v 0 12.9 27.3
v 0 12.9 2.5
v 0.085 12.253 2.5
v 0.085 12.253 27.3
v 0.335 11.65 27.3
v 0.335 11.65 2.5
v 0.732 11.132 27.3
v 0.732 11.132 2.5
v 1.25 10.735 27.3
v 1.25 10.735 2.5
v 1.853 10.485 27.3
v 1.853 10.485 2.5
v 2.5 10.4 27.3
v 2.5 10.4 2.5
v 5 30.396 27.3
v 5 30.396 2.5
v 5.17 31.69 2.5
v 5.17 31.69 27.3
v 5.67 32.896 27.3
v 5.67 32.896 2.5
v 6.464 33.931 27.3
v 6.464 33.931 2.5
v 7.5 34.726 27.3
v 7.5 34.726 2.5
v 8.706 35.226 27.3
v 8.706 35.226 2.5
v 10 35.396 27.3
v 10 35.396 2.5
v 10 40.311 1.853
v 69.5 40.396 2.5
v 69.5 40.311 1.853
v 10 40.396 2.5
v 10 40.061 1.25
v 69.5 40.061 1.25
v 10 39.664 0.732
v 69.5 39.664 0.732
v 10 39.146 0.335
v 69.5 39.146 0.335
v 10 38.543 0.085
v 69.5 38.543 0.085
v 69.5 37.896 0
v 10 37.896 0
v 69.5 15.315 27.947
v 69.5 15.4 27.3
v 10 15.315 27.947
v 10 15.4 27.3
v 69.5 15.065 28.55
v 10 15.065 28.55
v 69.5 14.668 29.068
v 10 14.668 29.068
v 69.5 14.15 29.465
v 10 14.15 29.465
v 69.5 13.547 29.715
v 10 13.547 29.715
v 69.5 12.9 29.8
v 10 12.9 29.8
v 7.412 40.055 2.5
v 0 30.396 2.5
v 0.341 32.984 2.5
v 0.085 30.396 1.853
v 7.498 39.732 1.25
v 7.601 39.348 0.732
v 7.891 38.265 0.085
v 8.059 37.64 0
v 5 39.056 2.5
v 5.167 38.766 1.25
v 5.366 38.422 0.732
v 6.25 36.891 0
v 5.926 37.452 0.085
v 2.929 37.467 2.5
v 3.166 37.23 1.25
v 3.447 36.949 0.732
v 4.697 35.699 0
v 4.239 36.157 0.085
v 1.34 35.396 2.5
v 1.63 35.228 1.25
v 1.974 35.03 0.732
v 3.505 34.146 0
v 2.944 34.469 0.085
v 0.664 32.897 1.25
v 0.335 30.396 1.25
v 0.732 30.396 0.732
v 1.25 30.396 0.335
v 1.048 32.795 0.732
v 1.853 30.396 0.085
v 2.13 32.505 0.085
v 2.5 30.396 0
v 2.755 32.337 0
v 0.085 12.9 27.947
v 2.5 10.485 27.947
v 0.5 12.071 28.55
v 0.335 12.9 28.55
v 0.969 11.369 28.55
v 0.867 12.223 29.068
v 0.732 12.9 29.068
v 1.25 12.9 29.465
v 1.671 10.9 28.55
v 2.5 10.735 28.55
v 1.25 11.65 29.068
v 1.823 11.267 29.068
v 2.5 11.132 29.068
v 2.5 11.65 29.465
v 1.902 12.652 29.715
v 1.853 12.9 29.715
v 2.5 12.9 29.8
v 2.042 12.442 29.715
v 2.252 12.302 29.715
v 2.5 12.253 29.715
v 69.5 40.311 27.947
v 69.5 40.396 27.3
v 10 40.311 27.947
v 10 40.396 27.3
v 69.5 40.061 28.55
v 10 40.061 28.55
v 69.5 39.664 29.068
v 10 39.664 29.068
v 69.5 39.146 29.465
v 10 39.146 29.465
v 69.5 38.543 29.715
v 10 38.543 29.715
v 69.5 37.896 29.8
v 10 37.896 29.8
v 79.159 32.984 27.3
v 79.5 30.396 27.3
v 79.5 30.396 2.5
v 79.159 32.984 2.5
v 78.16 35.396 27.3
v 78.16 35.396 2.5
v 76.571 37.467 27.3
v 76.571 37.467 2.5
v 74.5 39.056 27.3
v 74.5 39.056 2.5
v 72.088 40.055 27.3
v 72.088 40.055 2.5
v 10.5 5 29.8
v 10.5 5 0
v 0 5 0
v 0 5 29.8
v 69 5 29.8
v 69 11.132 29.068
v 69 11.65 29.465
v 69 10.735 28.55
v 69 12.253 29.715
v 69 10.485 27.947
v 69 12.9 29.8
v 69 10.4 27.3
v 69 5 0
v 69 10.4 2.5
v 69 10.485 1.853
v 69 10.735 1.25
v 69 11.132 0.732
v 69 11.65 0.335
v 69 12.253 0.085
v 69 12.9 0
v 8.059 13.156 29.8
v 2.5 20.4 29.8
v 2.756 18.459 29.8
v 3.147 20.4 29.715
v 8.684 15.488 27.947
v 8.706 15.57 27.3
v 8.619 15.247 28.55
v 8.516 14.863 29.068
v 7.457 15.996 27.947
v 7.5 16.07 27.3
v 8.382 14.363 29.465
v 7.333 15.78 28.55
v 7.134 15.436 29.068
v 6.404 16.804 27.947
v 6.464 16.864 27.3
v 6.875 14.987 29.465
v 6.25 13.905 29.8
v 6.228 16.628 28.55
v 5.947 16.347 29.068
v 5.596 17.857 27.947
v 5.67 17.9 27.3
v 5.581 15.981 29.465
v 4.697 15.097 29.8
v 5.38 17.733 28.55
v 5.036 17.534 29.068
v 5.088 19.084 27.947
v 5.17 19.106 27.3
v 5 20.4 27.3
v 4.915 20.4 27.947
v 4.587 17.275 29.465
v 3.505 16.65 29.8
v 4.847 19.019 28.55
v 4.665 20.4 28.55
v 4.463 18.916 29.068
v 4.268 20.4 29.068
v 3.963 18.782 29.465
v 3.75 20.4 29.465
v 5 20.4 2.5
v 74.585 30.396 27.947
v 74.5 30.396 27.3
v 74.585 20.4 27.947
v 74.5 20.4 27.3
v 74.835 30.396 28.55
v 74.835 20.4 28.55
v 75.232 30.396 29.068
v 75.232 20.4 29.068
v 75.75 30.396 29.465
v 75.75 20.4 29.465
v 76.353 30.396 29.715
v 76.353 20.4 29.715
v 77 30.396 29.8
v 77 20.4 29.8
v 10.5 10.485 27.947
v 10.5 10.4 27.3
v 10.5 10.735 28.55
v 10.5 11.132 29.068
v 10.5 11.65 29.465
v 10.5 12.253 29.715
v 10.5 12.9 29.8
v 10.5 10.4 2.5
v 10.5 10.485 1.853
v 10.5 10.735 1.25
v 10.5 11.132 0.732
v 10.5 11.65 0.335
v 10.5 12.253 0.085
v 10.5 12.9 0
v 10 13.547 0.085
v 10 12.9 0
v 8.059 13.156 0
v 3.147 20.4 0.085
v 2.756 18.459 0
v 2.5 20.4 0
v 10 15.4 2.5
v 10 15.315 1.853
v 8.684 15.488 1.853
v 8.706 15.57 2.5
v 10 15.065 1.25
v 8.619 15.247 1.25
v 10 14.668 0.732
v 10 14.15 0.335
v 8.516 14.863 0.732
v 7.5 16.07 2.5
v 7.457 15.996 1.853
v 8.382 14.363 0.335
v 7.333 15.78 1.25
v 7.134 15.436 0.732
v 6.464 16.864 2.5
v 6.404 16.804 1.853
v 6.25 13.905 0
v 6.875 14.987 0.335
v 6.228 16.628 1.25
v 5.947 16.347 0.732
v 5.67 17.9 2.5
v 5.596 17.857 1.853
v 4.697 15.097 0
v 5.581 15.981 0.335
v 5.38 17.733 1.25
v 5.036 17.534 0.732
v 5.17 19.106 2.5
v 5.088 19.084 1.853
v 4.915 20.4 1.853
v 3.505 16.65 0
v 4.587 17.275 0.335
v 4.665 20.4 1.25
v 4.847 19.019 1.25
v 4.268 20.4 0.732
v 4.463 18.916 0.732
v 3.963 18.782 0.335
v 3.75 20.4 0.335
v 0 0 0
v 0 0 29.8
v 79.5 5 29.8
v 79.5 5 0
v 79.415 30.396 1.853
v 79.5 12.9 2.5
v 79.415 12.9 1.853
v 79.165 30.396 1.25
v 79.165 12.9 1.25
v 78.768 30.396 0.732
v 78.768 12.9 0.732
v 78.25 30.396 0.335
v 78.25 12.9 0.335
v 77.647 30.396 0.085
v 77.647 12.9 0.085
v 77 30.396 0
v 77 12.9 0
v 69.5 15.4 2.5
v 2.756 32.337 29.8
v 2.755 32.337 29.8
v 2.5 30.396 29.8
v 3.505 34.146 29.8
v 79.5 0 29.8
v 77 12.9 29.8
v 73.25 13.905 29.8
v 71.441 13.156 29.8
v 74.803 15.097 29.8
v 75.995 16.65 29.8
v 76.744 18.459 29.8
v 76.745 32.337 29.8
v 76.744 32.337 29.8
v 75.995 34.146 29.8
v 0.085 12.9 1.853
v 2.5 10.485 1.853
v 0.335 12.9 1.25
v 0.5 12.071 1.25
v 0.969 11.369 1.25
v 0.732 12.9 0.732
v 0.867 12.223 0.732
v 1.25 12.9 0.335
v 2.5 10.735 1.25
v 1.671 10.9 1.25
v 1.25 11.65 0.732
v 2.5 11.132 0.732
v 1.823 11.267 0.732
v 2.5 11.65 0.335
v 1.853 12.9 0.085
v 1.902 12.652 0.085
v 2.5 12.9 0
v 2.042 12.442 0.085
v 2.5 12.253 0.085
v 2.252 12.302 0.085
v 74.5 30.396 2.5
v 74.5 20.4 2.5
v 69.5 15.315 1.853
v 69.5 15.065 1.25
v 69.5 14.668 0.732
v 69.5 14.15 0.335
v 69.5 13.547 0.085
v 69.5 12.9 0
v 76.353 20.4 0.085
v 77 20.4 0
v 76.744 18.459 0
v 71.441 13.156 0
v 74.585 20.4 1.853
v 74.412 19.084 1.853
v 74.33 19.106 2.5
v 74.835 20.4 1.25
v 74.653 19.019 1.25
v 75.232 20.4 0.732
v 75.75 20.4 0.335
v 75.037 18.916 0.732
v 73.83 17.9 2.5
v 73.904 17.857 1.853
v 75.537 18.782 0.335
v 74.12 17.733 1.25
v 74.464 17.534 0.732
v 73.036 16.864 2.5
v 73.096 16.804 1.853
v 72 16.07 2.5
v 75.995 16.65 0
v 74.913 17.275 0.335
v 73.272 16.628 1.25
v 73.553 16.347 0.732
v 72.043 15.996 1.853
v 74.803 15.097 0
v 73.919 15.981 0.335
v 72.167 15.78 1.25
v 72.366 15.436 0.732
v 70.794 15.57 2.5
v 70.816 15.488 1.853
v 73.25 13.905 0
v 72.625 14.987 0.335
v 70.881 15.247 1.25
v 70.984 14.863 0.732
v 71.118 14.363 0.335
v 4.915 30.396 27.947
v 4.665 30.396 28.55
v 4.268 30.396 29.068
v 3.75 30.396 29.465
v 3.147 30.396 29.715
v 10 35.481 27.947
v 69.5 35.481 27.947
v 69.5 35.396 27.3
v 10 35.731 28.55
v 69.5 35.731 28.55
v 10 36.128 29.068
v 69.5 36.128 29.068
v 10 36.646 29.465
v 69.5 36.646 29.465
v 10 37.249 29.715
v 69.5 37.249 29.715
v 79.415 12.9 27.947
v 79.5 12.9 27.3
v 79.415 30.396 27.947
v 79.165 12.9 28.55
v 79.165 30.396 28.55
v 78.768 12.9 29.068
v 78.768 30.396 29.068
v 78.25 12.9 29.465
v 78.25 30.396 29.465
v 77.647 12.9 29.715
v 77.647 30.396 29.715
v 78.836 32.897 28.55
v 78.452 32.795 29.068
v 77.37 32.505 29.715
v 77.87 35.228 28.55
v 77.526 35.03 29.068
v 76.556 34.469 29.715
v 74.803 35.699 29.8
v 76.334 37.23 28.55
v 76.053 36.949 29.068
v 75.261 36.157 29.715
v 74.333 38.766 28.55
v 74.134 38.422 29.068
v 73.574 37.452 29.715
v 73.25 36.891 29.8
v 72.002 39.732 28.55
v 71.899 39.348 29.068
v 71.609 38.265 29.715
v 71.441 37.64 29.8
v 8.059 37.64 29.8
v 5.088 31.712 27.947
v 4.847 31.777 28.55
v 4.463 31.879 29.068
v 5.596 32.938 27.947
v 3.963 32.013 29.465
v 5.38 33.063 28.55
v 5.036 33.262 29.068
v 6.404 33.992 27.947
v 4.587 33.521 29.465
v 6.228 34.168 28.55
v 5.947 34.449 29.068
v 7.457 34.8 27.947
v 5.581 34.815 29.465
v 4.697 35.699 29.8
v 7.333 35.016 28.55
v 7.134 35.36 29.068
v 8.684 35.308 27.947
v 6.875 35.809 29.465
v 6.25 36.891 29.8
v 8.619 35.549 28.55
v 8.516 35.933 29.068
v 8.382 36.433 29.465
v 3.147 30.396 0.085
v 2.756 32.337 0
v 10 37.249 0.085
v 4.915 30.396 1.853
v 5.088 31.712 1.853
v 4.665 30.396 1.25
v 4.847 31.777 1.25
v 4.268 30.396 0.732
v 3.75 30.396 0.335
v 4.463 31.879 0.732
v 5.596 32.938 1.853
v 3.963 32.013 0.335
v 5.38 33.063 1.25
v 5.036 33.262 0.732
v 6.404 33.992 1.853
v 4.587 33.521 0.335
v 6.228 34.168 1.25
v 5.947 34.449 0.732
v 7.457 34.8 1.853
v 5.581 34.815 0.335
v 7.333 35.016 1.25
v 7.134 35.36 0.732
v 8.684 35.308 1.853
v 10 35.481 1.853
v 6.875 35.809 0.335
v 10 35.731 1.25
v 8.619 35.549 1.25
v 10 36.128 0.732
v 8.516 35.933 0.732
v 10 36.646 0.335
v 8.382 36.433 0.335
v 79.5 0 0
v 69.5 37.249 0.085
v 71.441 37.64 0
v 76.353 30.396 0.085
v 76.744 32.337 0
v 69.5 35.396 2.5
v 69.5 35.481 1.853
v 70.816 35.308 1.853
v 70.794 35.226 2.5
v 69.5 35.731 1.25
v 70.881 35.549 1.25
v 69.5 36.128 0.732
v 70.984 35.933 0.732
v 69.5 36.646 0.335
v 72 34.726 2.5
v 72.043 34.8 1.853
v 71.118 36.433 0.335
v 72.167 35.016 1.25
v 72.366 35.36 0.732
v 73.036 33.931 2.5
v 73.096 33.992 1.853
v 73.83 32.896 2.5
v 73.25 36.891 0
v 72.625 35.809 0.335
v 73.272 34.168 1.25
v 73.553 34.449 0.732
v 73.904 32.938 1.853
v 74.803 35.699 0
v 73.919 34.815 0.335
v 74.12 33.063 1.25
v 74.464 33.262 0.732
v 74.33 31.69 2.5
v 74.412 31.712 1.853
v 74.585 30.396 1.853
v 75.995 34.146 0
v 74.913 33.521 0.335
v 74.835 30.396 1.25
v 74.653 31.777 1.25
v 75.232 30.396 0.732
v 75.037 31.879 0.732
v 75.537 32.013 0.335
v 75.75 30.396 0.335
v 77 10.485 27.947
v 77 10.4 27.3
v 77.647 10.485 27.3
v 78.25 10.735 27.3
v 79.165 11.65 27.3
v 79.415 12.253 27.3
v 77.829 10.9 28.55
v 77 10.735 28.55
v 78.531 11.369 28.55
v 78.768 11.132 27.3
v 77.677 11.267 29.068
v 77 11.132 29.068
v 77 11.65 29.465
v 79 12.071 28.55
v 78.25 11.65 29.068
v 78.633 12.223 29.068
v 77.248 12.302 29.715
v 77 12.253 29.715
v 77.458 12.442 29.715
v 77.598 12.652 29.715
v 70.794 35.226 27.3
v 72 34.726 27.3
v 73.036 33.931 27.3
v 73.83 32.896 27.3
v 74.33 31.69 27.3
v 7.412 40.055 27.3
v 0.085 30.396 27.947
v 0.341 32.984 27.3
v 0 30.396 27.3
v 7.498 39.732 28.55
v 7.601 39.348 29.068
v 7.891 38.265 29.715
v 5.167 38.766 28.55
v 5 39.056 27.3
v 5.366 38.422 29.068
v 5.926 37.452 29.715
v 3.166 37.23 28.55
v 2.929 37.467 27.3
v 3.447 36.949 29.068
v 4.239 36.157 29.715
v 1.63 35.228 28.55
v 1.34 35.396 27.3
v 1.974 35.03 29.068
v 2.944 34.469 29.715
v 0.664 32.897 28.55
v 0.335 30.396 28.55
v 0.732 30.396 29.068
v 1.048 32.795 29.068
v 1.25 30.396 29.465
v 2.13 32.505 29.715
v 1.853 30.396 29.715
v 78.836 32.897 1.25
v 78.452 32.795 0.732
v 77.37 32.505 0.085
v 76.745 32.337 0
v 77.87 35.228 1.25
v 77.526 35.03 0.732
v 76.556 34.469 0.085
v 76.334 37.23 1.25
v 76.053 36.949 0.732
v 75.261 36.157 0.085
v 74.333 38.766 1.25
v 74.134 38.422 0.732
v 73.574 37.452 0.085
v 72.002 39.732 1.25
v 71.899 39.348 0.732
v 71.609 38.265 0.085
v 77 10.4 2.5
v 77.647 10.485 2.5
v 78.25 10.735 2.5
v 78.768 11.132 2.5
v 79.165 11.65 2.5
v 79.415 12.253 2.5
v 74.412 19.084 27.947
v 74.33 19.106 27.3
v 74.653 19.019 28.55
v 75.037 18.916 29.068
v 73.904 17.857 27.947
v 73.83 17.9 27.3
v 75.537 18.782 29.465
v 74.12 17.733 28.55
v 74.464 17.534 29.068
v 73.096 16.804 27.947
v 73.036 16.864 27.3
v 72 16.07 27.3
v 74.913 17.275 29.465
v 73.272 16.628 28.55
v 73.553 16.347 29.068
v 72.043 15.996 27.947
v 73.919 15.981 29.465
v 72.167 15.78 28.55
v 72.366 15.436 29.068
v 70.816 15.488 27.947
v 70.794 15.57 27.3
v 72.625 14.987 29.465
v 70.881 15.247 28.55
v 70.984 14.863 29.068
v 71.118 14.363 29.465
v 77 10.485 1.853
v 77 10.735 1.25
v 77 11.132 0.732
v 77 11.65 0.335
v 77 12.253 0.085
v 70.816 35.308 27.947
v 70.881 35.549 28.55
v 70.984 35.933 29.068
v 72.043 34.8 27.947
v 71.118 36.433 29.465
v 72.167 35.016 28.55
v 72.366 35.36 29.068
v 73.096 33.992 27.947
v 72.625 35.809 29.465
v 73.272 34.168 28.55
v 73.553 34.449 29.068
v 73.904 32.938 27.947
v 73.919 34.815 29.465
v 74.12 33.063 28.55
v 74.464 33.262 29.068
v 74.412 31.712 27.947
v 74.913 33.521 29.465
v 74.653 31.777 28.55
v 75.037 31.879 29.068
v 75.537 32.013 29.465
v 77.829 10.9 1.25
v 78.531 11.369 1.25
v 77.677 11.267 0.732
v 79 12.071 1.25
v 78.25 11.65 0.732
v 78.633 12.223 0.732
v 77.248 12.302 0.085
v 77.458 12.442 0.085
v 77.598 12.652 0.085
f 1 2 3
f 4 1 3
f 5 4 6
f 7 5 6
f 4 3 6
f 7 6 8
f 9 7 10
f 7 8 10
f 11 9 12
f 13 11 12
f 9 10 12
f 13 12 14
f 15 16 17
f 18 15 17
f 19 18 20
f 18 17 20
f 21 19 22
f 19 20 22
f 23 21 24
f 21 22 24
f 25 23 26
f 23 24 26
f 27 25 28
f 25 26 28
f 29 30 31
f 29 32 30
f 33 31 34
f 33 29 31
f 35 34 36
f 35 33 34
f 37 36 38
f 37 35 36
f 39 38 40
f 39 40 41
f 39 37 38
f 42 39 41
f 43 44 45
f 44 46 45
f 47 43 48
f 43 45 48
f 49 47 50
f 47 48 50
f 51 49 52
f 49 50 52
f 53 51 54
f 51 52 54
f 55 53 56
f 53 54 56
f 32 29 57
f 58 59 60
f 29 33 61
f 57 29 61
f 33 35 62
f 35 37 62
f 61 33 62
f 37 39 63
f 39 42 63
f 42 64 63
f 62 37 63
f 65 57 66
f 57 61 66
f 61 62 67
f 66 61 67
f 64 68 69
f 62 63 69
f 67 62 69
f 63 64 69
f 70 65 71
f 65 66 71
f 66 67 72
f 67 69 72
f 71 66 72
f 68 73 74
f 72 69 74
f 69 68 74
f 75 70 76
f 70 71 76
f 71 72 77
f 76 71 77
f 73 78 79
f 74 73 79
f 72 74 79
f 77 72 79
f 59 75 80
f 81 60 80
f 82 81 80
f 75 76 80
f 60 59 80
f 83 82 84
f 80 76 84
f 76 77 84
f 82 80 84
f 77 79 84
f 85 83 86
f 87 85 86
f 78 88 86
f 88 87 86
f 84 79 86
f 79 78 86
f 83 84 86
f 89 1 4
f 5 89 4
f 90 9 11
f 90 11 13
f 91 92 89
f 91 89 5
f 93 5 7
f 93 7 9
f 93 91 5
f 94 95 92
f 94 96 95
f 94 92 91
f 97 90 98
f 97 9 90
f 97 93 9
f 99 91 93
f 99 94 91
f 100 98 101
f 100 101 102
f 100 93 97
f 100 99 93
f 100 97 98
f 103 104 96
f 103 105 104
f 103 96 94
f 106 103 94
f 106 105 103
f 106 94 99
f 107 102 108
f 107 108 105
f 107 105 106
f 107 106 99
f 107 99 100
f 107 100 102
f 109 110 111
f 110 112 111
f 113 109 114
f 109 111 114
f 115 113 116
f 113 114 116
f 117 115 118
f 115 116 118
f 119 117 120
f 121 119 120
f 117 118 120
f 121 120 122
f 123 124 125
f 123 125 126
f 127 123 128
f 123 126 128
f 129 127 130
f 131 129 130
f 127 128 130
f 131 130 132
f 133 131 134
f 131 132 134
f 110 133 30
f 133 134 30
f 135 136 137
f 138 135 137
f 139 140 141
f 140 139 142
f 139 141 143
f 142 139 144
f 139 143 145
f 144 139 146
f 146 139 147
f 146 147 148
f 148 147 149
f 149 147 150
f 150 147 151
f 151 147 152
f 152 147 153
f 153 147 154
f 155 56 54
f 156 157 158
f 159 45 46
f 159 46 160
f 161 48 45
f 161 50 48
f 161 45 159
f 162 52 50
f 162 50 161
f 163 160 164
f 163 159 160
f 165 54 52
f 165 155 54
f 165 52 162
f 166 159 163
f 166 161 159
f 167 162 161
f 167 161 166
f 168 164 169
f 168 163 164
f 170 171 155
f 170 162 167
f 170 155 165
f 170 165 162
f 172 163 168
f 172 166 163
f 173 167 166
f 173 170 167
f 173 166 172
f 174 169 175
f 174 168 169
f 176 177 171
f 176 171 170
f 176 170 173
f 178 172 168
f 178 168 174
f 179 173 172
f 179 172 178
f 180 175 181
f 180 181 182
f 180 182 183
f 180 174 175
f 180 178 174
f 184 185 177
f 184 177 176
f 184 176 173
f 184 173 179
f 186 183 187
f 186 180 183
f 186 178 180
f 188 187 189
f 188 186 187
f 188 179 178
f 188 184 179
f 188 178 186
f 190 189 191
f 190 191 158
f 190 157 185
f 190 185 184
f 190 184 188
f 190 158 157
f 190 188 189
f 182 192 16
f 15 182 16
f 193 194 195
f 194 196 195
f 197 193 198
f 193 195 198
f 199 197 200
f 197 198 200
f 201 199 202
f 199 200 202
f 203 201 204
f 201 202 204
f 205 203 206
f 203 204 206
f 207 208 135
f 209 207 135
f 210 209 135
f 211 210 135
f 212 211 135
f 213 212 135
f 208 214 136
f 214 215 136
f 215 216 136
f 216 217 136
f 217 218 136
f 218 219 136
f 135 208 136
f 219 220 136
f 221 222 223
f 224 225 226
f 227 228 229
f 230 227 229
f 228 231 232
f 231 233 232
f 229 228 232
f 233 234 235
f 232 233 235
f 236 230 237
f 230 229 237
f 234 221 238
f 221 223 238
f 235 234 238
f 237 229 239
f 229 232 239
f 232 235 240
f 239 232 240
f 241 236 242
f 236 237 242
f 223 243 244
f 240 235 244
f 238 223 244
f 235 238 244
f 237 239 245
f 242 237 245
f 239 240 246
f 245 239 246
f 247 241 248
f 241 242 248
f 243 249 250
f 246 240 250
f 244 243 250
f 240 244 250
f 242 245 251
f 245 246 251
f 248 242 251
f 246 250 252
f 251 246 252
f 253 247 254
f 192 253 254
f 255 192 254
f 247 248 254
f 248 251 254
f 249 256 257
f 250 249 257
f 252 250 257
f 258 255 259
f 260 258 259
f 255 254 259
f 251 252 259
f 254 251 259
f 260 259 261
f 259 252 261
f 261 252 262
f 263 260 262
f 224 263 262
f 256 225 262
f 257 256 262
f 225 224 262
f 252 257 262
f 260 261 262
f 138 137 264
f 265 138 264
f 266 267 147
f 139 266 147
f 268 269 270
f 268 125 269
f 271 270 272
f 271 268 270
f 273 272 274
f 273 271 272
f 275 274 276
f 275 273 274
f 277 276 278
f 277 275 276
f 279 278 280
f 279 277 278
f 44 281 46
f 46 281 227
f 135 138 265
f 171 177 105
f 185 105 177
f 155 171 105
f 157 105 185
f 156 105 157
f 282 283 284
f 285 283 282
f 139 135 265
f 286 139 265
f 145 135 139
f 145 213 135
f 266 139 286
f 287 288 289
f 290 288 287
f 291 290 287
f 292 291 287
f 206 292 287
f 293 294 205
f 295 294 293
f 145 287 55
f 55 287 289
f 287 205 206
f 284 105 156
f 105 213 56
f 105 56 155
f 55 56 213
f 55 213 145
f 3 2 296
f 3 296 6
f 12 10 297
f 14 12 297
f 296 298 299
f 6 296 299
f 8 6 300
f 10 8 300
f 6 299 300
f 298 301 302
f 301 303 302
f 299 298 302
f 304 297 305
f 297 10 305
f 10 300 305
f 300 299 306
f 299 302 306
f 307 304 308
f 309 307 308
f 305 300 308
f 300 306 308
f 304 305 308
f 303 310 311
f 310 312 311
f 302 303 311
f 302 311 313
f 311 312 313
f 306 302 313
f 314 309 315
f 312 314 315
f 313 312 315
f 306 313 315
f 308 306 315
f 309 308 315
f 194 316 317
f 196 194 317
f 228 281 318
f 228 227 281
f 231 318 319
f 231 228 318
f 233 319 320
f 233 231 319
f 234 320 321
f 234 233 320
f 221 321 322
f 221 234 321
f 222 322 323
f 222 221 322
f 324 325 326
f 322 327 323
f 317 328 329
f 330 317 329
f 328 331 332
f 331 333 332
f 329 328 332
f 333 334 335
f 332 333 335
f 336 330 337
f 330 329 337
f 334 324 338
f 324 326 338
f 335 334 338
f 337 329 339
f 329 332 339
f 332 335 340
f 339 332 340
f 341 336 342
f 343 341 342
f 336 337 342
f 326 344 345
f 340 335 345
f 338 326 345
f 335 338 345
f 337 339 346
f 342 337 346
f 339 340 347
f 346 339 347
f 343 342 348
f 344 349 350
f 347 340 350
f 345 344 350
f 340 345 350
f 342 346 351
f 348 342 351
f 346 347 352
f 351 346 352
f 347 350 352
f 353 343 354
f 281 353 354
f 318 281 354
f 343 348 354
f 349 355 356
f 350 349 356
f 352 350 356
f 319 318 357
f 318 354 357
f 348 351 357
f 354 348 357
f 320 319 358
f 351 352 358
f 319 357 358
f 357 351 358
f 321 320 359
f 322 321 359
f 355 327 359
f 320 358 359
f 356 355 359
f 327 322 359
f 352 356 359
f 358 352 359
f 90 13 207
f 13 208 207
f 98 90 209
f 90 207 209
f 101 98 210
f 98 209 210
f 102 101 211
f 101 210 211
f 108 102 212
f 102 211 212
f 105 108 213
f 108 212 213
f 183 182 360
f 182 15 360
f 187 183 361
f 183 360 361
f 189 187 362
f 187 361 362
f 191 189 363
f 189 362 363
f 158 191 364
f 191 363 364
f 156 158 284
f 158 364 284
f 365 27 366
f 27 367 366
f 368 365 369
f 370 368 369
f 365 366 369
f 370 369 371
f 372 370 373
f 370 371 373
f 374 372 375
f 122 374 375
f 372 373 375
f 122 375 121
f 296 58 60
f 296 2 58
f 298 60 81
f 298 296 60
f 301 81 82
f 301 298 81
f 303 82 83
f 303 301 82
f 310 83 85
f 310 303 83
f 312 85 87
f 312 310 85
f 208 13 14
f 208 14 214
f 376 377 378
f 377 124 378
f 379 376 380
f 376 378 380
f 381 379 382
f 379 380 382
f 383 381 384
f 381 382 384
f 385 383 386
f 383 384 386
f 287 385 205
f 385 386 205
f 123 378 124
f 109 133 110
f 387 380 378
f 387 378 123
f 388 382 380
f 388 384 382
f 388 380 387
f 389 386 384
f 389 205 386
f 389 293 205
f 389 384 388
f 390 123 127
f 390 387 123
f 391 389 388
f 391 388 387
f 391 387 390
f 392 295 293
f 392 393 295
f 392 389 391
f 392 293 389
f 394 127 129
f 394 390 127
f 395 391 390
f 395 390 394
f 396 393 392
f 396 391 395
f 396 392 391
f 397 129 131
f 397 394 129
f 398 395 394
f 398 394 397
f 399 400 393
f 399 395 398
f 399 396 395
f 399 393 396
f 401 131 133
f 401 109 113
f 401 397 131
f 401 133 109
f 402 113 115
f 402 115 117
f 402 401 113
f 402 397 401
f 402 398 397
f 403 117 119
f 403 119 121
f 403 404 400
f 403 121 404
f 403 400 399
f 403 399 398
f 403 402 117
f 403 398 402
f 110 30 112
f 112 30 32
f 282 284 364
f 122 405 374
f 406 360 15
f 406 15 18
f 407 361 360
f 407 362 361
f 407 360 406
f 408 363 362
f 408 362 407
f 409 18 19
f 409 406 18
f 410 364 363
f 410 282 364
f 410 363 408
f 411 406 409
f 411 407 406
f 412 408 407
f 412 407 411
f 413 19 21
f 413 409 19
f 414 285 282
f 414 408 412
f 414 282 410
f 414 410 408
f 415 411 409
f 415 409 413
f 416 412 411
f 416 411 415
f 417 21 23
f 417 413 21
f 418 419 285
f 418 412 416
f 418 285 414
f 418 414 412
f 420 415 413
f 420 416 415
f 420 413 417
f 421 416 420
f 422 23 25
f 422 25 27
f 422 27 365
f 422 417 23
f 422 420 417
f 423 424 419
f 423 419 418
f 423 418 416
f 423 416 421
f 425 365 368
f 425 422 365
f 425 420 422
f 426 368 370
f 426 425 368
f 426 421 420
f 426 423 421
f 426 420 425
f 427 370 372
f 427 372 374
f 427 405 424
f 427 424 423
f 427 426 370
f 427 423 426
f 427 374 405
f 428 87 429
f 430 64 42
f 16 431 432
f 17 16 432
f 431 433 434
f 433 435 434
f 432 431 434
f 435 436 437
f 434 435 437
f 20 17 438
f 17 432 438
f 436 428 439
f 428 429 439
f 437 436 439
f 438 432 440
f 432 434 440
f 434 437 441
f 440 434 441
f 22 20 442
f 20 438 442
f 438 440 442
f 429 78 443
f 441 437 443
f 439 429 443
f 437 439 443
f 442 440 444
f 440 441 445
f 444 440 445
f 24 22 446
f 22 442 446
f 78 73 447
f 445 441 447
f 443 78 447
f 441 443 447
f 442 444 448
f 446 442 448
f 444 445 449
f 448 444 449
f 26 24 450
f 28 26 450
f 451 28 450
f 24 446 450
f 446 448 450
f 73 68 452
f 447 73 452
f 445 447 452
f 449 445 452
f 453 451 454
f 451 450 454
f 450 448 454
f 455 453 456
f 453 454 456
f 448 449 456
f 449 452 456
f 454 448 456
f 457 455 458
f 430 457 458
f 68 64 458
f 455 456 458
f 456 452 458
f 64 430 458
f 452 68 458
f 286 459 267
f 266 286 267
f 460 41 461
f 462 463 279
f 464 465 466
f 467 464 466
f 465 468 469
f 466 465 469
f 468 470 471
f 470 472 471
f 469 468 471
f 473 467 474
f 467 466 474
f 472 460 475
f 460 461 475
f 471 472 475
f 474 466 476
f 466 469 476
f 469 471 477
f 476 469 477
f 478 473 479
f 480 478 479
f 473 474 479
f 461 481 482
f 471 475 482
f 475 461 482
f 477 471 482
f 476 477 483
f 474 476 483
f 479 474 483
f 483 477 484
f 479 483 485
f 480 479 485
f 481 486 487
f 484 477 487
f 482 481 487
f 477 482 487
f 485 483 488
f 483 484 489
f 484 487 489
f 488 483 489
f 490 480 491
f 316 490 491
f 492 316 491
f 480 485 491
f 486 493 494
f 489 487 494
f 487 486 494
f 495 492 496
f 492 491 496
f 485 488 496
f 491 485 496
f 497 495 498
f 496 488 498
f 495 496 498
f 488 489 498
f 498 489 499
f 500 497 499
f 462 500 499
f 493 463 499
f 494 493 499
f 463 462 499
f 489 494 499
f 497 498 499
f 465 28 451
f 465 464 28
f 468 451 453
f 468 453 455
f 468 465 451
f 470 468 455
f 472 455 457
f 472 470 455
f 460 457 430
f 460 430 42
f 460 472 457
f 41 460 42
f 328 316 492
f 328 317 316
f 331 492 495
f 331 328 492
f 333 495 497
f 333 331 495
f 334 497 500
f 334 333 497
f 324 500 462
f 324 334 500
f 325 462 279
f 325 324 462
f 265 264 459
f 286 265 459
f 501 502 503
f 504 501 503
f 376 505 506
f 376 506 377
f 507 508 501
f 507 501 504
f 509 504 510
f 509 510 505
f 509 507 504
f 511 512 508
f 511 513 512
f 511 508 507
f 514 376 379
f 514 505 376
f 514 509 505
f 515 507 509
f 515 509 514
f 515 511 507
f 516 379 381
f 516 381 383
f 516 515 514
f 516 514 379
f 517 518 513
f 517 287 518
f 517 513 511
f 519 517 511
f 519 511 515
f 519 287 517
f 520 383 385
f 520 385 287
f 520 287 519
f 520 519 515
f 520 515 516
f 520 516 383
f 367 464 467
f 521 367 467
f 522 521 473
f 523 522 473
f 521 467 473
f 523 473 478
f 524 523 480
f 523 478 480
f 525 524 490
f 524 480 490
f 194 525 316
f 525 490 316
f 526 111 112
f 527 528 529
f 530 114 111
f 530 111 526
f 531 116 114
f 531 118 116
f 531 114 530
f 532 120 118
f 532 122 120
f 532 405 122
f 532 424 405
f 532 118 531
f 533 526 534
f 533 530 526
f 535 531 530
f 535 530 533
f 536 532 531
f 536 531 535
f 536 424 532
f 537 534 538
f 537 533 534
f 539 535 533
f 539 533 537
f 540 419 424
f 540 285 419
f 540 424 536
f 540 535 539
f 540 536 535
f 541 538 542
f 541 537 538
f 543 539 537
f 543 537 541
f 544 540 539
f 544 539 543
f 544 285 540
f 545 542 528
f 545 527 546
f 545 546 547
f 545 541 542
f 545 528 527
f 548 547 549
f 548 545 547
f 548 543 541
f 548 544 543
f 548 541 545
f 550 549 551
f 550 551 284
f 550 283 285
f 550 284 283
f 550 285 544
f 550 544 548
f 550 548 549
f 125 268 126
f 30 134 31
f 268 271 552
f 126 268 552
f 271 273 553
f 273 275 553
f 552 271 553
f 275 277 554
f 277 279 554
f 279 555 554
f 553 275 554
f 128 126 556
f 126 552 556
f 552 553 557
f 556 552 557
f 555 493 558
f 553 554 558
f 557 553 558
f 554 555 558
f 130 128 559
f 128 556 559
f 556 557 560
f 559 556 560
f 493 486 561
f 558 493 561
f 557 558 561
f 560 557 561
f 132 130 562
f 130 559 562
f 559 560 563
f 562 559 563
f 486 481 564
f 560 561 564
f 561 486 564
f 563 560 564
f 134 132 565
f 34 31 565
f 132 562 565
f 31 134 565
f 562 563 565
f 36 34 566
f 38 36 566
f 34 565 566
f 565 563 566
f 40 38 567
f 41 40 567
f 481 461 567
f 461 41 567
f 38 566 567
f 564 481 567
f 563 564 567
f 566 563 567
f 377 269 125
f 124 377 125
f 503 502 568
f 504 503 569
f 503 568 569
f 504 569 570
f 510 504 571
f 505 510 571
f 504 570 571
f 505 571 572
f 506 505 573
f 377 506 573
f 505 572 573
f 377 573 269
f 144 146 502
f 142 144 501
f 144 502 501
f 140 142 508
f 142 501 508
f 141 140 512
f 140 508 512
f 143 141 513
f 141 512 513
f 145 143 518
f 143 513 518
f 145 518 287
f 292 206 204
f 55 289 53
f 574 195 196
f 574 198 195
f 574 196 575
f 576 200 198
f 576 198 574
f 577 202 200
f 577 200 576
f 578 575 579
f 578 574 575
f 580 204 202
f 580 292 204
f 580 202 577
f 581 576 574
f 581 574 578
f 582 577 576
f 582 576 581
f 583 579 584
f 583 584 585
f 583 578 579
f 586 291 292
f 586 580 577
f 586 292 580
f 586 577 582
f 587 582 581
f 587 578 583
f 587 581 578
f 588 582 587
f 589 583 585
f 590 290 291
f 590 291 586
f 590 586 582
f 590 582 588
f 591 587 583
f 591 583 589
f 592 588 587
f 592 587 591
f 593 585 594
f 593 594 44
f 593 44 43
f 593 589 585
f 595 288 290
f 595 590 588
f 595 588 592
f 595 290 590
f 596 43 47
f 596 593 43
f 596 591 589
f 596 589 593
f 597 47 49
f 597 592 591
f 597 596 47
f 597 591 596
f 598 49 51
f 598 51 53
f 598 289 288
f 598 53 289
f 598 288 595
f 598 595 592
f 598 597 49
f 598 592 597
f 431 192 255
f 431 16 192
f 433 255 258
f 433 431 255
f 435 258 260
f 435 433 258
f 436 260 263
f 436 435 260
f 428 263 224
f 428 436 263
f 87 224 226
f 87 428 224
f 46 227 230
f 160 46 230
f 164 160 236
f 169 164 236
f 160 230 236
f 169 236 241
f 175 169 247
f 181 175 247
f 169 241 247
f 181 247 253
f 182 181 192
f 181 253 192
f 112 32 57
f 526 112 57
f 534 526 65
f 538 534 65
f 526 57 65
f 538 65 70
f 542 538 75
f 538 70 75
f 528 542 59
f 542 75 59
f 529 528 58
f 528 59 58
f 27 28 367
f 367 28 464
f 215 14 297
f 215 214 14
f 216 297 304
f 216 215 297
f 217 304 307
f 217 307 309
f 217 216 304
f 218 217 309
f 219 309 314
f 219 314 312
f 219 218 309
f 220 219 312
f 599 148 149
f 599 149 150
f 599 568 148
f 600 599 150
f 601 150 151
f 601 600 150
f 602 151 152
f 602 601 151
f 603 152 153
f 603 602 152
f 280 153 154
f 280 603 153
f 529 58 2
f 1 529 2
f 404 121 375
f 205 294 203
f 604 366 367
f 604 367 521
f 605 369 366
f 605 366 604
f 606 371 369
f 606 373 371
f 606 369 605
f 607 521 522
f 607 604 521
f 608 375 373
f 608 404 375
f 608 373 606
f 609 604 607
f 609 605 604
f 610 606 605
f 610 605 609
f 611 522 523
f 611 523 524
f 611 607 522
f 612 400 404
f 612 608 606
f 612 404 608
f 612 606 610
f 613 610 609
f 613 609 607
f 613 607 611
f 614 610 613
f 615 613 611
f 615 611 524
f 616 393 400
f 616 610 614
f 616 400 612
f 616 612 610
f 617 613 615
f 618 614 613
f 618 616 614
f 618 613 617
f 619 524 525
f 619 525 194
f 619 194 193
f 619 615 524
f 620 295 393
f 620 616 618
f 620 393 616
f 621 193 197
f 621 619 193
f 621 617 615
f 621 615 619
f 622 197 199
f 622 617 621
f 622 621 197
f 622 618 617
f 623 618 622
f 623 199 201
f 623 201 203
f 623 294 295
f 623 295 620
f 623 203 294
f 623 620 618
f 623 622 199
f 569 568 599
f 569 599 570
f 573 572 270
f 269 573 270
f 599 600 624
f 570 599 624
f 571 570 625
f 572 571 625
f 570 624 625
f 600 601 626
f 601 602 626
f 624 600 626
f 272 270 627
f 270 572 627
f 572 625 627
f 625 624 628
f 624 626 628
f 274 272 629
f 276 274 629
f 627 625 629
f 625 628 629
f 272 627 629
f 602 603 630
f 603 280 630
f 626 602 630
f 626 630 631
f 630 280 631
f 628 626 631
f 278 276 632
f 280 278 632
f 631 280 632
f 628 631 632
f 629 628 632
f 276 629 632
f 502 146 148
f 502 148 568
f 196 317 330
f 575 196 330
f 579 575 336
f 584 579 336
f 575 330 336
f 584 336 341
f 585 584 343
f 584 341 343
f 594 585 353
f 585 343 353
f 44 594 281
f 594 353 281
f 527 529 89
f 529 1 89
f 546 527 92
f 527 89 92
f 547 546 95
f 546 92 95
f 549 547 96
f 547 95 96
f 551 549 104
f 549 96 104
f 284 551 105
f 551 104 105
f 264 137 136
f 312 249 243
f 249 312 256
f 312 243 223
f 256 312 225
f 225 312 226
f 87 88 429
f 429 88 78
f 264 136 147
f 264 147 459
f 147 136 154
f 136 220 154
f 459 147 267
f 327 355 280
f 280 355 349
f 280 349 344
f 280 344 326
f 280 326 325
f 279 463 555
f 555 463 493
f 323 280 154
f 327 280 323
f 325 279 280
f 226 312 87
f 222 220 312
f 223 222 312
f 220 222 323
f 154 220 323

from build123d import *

# Parameters (mm, degrees)
EXTRUDE_2_DEPTH = 29.8
FILLET_3_R      = 2.5


with BuildPart() as part:
    # Эскиз1 → Бобышка-Вытянуть2 (new body)
    with BuildSketch(Plane.XY):
        with BuildLine():
            Line((0, 0), (79.5, 0))
            Line((79.5, 0), (79.5, 5))
            Line((79.5, 5), (69, 5))
            Line((69, 5), (69, 10.4))
            Line((69, 10.4), (77, 10.4))
            ThreePointArc((77, 10.4), (78.767766953, 11.132233047), (79.5, 12.9))
            Line((79.5, 12.9), (79.5, 30.395890056))
            ThreePointArc((79.5, 30.395890056), (76.571067812, 37.466957868), (69.5, 40.395890056))
            Line((69.5, 40.395890056), (10, 40.395890056))
            ThreePointArc((10, 40.395890056), (2.928932188, 37.466957868), (0, 30.395890056))
            Line((0, 30.395890056), (0, 12.9))
            ThreePointArc((0, 12.9), (0.732233047, 11.132233047), (2.5, 10.4))
            Line((2.5, 10.4), (10.5, 10.4))
            Line((10.5, 10.4), (10.5, 5))
            Line((10.5, 5), (0, 5))
            Line((0, 5), (0, 0))
        make_face()
        with BuildLine():
            Line((10, 35.395890056), (69.5, 35.395890056))
            ThreePointArc((69.5, 35.395890056), (73.035533906, 33.931423962), (74.5, 30.395890056))
            Line((74.5, 30.395890056), (74.5, 20.4))
            ThreePointArc((74.5, 20.4), (73.035533906, 16.864466094), (69.5, 15.4))
            Line((69.5, 15.4), (10, 15.4))
            ThreePointArc((10, 15.4), (6.464466094, 16.864466094), (5, 20.4))
            Line((5, 20.4), (5, 30.395890056))
            ThreePointArc((5, 30.395890056), (6.464466094, 33.931423962), (10, 35.395890056))
        make_face(mode=Mode.SUBTRACT)
    extrude(amount=EXTRUDE_2_DEPTH)

    # Скругление3
    fillet_3_edges = [part.edges().sort_by_distance(p)[0] for p in [
        (6.5, 10.4, 0),
        (0.732233047, 11.132233047, 0),
        (0, 21.647945028, 0),
        (2.928932188, 37.466957868, 0),
        (39.75, 40.395890056, 0),
        (76.571067812, 37.466957868, 0),
        (79.5, 21.647945028, 0),
        (78.767766953, 11.132233047, 0),
        (73, 10.4, 0),
        (73, 10.4, 29.8),
        (78.767766953, 11.132233047, 29.8),
        (79.5, 21.647945028, 29.8),
        (76.571067812, 37.466957868, 29.8),
        (39.75, 40.395890056, 29.8),
        (2.928932188, 37.466957868, 29.8),
        (73.035533906, 33.931423962, 0),
        (39.75, 35.395890056, 0),
        (6.464466094, 33.931423962, 0),
        (5, 25.397945028, 0),
        (6.464466094, 16.864466094, 0),
        (39.75, 15.4, 0),
        (73.035533906, 16.864466094, 0),
        (74.5, 25.397945028, 0),
        (0, 21.647945028, 29.8),
        (73.035533906, 33.931423962, 29.8),
        (39.75, 35.395890056, 29.8),
        (6.464466094, 33.931423962, 29.8),
        (5, 25.397945028, 29.8),
        (6.464466094, 16.864466094, 29.8),
        (39.75, 15.4, 29.8),
        (73.035533906, 16.864466094, 29.8),
        (74.5, 25.397945028, 29.8),
        (0.732233047, 11.132233047, 29.8),
        (6.5, 10.4, 29.8),
    ]]
    fillet(fillet_3_edges, radius=FILLET_3_R - 0.0001)  # a hair under: the kernel refuses the full size


solid = part.part
